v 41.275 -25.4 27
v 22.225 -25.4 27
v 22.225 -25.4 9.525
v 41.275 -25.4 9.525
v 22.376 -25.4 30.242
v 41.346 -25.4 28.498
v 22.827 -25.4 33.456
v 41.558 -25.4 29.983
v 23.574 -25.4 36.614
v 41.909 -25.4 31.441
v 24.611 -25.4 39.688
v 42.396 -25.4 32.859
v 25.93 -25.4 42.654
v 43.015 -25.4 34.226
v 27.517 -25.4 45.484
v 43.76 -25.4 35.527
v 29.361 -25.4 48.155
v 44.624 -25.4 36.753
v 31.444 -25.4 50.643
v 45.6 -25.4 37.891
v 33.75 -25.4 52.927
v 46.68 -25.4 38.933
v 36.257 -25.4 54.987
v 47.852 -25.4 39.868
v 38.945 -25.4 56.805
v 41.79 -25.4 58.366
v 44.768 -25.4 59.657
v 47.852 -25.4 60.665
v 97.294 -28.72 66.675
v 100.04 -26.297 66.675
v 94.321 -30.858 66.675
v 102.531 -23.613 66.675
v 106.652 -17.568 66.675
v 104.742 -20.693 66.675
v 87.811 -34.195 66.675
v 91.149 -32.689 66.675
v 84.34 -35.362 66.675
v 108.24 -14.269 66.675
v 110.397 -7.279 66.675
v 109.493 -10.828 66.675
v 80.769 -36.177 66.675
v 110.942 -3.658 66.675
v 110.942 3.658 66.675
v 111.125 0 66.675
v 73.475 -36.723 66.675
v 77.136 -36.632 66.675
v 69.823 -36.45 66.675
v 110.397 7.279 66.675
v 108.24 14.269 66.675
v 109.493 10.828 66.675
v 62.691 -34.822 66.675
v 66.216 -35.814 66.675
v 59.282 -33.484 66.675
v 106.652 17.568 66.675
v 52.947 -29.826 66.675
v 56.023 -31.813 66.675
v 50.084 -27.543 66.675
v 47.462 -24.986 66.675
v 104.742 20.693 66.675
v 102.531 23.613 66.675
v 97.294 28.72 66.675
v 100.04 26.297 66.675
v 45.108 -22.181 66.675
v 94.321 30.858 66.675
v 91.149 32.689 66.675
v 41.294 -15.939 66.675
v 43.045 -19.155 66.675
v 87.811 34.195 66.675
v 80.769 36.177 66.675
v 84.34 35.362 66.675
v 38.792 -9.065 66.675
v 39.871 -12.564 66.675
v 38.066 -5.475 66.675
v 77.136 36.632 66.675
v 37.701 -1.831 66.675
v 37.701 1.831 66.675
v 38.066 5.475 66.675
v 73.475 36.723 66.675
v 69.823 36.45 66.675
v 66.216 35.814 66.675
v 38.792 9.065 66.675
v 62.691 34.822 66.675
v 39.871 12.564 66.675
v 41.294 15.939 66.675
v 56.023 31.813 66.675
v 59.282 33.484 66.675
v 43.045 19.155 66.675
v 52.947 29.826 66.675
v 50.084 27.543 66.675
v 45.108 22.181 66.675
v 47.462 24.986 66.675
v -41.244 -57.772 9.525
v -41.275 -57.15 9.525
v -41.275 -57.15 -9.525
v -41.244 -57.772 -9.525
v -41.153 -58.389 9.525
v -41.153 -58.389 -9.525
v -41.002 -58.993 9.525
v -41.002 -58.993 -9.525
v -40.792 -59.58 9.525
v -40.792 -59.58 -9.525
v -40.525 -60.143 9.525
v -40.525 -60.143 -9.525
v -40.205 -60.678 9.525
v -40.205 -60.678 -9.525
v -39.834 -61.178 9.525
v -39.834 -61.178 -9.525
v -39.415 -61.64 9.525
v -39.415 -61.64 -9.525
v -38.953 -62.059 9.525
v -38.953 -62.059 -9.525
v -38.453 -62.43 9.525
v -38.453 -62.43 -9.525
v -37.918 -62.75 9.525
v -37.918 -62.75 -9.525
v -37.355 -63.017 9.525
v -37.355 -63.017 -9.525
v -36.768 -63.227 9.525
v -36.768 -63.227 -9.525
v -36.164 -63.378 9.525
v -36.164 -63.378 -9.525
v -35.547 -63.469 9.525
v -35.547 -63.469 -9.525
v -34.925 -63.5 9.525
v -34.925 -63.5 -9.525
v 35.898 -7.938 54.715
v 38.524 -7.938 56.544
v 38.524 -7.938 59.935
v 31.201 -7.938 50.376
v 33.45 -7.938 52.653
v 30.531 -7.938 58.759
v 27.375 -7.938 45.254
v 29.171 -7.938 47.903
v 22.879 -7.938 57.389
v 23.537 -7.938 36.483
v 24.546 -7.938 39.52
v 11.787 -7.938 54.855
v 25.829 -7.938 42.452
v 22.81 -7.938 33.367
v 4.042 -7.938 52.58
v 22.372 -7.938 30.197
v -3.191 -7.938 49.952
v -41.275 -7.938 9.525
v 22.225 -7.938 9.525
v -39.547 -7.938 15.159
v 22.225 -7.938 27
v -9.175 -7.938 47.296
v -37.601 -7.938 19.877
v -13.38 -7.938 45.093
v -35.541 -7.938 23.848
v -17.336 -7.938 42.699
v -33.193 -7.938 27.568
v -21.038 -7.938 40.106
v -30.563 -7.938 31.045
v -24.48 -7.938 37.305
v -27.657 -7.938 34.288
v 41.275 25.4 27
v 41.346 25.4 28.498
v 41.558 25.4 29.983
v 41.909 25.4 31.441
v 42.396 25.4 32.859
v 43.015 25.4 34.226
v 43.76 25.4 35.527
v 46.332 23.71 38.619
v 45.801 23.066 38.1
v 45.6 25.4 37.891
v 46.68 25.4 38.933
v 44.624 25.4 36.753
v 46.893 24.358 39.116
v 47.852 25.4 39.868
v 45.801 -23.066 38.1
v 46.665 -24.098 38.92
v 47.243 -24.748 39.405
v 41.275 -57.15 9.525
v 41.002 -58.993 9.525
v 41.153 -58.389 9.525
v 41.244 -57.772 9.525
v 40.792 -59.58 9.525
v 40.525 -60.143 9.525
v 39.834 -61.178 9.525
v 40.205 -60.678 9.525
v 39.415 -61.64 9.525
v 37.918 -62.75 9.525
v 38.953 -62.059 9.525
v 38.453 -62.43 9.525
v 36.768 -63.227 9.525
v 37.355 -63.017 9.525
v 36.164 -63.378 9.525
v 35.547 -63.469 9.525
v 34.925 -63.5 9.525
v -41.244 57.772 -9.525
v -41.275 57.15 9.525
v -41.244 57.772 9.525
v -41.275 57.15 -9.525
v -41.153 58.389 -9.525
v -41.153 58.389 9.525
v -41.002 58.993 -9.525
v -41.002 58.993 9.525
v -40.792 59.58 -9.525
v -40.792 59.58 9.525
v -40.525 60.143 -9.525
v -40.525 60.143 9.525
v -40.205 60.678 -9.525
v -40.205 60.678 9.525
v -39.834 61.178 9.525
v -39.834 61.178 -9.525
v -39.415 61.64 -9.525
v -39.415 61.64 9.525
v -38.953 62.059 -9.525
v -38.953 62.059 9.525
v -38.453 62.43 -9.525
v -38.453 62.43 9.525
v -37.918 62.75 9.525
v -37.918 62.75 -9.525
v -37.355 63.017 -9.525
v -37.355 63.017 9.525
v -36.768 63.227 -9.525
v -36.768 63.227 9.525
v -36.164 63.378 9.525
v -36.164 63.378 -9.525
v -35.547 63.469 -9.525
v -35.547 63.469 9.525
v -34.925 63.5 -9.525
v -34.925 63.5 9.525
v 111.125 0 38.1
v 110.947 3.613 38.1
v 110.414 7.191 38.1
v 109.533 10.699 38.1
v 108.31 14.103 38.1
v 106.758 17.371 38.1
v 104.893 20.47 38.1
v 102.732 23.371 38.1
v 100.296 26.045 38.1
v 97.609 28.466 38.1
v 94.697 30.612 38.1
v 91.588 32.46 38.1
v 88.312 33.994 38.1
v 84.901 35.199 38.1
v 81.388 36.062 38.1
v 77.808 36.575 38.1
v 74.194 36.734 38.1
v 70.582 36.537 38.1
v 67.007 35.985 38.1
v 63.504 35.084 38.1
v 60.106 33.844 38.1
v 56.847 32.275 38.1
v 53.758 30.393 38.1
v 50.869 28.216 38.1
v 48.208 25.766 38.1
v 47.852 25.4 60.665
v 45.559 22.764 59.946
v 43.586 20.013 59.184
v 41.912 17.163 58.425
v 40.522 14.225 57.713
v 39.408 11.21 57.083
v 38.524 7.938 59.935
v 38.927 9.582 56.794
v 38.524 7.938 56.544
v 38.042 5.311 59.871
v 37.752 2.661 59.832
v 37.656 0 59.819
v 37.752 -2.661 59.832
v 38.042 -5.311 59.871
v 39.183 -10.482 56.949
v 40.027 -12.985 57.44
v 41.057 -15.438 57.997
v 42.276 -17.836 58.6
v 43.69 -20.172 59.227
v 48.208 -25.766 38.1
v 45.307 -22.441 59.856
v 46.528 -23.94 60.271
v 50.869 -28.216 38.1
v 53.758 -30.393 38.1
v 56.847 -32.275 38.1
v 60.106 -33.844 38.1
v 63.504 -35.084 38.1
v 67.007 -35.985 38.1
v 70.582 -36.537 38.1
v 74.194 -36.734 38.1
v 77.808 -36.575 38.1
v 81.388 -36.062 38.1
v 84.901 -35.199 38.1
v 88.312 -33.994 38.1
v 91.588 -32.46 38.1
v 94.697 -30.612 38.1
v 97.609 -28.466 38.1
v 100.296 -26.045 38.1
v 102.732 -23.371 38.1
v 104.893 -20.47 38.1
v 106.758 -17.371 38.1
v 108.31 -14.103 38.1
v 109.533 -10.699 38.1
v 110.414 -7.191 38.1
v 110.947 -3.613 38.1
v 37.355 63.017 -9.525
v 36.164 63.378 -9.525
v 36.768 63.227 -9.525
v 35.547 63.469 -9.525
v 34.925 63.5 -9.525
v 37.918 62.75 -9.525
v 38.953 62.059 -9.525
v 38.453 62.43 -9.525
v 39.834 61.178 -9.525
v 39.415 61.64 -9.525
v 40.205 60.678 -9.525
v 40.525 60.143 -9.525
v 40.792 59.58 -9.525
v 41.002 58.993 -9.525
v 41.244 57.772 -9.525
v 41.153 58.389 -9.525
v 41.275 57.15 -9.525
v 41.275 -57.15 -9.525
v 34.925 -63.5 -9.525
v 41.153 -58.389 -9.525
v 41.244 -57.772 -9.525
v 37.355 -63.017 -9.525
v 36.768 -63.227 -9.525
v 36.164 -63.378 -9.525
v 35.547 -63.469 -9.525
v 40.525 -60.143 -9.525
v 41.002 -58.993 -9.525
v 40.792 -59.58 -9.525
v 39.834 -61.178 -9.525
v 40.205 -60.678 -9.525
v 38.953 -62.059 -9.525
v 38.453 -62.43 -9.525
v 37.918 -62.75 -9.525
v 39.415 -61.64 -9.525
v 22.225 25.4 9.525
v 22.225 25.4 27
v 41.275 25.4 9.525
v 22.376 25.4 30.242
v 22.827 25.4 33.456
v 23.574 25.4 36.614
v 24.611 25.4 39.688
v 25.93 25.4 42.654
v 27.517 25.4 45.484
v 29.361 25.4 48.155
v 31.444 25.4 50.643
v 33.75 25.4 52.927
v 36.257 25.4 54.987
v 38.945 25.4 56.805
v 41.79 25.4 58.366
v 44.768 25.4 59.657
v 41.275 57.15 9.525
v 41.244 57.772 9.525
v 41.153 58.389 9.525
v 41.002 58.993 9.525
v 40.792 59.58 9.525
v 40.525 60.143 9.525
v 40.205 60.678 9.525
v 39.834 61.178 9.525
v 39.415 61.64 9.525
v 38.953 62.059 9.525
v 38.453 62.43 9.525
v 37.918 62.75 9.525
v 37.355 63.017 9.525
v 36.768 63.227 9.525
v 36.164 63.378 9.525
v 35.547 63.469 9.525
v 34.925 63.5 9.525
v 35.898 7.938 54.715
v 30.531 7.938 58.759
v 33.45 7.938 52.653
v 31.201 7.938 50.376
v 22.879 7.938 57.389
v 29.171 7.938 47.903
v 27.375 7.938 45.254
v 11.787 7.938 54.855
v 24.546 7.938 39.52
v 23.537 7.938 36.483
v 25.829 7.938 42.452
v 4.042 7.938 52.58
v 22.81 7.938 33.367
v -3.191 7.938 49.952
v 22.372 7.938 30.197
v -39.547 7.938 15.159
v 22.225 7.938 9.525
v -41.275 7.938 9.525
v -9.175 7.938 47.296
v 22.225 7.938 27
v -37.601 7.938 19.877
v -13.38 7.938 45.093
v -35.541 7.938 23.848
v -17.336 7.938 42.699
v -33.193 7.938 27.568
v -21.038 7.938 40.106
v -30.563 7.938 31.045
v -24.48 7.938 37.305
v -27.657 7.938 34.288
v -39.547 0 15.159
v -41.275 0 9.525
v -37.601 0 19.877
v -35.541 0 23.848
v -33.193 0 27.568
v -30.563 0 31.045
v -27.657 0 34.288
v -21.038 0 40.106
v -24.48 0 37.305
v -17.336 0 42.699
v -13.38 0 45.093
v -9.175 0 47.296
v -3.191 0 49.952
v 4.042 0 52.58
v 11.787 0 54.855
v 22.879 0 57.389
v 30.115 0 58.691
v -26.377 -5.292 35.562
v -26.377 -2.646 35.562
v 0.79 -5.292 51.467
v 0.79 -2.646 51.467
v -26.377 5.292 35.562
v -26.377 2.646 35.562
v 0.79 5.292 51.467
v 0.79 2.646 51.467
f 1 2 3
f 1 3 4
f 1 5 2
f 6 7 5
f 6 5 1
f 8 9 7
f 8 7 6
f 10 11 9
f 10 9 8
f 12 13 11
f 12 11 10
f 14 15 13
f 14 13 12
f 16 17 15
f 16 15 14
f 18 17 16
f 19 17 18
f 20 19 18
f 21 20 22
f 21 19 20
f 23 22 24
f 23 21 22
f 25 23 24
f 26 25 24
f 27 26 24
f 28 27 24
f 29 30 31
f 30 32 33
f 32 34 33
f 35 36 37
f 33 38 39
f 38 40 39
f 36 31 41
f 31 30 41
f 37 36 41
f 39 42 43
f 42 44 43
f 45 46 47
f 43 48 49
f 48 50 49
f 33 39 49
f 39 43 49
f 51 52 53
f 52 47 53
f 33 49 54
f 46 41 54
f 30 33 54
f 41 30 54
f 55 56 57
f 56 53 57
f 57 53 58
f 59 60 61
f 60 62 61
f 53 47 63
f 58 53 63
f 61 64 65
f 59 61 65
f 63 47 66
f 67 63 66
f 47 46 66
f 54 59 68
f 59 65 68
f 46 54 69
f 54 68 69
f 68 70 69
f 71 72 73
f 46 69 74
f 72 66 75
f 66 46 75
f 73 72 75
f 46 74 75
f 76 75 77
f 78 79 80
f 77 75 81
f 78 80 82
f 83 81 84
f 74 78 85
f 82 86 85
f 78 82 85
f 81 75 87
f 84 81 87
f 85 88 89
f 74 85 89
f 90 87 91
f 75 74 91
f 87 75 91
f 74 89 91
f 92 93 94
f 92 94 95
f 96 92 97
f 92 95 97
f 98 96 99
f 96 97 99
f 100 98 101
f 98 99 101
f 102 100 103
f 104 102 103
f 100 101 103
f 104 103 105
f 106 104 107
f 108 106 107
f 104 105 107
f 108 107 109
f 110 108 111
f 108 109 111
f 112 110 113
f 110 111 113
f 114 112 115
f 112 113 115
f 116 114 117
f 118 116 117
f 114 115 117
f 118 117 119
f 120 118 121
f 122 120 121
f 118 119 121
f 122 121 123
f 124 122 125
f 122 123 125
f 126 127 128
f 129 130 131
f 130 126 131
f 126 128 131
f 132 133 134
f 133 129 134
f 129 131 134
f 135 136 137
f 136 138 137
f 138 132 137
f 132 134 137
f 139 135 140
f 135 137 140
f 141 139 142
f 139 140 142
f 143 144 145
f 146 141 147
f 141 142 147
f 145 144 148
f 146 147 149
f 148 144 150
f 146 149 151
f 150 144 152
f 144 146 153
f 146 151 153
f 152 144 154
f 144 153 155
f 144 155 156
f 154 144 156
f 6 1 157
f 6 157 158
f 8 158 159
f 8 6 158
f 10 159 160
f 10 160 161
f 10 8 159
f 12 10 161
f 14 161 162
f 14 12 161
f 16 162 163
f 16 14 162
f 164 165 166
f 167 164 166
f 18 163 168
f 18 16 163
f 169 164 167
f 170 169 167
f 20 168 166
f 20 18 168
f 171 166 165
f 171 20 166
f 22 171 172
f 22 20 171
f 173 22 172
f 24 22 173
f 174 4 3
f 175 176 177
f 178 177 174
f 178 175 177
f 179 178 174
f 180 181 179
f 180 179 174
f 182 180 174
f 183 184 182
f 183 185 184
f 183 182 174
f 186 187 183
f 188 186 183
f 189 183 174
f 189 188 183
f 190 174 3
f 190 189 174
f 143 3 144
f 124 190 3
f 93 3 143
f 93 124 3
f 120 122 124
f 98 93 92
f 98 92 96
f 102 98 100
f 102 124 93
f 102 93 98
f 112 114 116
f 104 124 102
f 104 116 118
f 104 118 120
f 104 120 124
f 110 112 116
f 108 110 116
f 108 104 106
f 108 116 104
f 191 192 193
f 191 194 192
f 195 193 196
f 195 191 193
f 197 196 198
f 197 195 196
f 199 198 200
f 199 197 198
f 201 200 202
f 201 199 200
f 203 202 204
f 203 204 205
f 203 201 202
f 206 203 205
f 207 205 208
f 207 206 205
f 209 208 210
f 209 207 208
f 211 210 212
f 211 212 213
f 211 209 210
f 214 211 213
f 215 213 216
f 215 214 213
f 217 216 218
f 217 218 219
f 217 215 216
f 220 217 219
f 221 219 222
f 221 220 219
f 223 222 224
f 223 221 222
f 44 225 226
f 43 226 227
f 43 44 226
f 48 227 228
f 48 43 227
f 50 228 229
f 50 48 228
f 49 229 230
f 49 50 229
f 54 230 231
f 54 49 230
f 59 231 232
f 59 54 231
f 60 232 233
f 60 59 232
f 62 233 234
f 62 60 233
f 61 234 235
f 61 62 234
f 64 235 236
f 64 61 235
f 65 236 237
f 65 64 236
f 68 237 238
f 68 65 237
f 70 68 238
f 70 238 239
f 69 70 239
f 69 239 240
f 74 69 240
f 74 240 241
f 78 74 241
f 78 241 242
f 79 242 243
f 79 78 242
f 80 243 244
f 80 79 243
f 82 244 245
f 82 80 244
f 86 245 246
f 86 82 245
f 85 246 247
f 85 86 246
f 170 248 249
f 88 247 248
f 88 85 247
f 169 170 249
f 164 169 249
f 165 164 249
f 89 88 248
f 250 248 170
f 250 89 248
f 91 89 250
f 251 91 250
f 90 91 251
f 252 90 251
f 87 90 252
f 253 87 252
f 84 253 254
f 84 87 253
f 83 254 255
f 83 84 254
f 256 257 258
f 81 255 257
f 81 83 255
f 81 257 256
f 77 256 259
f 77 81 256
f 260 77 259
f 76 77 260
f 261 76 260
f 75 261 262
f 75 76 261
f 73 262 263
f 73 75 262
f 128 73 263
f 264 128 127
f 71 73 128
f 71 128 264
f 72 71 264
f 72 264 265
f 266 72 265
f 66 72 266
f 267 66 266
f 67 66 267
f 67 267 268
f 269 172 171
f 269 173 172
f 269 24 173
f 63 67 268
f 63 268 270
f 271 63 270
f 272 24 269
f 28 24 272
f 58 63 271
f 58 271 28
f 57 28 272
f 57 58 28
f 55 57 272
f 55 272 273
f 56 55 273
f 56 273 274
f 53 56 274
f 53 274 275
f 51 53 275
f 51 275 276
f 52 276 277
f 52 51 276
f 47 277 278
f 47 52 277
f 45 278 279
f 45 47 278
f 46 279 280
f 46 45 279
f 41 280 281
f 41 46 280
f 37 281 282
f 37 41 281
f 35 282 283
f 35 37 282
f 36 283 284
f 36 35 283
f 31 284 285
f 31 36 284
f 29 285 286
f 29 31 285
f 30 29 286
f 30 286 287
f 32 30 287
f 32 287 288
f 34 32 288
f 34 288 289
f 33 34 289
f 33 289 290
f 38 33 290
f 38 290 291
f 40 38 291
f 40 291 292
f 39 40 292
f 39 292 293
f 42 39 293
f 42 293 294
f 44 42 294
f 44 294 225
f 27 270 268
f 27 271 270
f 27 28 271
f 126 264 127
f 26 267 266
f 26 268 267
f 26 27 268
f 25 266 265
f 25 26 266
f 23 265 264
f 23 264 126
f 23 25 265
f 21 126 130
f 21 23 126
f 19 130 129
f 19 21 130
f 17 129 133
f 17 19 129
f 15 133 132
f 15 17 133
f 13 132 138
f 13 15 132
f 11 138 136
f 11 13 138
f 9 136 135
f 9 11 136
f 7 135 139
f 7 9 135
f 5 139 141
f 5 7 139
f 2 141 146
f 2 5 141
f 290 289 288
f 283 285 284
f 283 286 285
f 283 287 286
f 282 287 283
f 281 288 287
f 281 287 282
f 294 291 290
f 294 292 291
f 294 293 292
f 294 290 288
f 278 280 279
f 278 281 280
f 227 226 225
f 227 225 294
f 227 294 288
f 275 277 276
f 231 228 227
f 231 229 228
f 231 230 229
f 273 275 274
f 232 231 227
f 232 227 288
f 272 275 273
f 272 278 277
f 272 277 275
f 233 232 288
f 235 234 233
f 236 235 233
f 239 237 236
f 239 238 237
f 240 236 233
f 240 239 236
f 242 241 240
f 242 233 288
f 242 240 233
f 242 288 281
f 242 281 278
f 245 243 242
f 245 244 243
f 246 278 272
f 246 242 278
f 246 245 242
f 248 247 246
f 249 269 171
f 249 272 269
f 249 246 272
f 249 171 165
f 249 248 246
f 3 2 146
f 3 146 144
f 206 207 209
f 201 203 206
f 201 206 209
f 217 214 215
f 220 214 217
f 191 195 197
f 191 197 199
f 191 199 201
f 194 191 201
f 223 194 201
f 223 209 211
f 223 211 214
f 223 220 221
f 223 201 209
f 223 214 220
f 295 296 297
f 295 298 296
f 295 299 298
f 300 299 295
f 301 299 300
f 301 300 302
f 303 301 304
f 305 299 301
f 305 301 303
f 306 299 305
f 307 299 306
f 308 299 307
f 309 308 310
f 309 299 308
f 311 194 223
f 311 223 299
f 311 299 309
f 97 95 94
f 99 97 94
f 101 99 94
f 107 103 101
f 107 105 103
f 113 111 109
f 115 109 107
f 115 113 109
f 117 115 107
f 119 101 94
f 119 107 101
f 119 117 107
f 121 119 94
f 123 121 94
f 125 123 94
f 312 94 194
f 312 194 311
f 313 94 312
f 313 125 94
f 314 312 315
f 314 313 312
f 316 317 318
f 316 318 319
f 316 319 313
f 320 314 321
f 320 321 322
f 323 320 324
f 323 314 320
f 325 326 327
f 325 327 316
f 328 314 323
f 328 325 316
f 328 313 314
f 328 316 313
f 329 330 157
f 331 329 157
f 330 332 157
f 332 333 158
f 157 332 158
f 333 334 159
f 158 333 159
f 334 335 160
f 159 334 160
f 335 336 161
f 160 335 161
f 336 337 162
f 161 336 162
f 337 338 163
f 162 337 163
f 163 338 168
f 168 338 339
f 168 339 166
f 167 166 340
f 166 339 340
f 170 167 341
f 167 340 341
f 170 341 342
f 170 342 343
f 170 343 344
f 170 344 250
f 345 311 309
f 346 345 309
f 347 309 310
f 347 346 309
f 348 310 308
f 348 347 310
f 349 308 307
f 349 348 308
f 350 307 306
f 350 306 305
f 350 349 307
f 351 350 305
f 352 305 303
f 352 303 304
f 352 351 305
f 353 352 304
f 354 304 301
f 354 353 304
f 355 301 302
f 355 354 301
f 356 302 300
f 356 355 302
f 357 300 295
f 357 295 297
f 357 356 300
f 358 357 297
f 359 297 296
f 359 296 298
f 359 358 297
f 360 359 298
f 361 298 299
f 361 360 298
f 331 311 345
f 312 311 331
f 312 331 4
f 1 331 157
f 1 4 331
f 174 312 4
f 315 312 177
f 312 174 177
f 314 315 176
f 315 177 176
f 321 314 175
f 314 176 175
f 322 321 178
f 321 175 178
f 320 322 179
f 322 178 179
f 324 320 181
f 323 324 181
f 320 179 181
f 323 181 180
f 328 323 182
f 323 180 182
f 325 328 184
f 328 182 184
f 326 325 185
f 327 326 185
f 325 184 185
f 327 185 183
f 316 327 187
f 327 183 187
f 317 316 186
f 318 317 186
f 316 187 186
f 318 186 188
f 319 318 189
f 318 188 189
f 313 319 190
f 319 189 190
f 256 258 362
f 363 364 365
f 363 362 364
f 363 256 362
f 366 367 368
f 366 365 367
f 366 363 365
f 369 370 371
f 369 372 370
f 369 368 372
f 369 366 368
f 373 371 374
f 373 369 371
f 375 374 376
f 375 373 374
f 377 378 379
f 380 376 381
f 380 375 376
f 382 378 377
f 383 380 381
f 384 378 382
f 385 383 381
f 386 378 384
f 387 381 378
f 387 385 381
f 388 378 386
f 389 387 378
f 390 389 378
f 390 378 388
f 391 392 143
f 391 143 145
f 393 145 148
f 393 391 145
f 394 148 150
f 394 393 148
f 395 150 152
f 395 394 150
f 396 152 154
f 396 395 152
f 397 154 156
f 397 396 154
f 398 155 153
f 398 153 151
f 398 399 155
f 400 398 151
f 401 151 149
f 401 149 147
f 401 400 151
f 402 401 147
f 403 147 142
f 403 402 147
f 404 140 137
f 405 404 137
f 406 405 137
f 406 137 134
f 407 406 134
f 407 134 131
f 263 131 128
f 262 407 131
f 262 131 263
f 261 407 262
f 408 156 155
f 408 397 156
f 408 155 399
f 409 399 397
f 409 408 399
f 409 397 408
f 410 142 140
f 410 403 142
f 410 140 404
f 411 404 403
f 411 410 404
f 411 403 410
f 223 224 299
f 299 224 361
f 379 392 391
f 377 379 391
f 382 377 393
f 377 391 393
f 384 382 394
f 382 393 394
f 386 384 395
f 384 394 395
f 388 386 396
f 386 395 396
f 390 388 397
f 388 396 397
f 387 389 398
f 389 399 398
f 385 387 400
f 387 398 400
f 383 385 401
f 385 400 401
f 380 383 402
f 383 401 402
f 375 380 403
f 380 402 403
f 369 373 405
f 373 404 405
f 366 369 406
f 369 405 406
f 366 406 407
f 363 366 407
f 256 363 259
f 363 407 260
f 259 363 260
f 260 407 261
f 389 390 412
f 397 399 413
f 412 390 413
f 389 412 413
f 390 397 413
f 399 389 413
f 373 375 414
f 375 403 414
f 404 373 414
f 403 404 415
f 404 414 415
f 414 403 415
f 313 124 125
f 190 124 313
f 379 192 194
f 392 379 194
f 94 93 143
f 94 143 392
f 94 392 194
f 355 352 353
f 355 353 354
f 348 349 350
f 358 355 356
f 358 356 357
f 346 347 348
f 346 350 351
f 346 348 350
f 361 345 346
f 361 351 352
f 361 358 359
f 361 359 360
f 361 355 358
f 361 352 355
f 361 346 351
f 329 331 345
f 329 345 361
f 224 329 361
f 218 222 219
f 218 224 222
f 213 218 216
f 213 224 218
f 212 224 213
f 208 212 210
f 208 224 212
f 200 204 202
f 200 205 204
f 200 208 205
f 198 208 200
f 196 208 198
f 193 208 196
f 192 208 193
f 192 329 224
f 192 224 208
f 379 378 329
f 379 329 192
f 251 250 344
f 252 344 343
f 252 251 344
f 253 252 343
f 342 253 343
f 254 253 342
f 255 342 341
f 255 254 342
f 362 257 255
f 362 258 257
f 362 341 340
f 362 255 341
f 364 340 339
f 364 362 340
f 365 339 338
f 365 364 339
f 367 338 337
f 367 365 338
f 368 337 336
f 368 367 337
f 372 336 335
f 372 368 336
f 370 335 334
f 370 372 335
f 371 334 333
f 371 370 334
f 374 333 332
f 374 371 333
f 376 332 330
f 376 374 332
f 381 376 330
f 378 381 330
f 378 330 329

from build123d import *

# Parameters (mm, degrees)
F1_DEPTH = 63.5
F2_DEPTH = 25.4
F3_DEPTH = 7.9375
F0_W     = 36.734618
F0_H     = 28.575
F5_R     = 6.35


with BuildPart() as f1:
    # F0 (on Front) → F1 (new body, symmetric)
    with BuildSketch(Plane.XZ):
        Polygon((-41.275, 9.525), (-41.275, -9.525), (41.275, -9.525), (41.275, 9.525), (22.225, 9.525), align=None)
    extrude(amount=F1_DEPTH, both=True)

    # F0 (on Front) → F2 (join, symmetric)
    with BuildSketch(Plane.XZ):
        with BuildLine():
            Line((22.225, 9.525), (41.275, 9.525))
            Line((41.275, 9.525), (41.275, 27.0002))
            ThreePointArc((41.275, 27.0002), (45.92468, 38.22552), (57.15, 42.8752))
            Line((57.15, 42.8752), (60.325, 42.8752))
            Line((60.325, 42.8752), (60.325, 61.9252))
            Line((60.325, 61.9252), (57.15, 61.9252))
            add(Edge.make_bspline(
                [(50.826813, 61.348023), (52.907758, 61.552865), (55.015741, 61.744854), (57.15, 61.9252)],
                knots=[106.970225, 106.970225, 106.970225, 106.970225, 111.504536, 111.504536, 111.504536, 111.504536], degree=3))
            ThreePointArc((50.826813, 61.348023), (30.311661, 49.348783), (22.225, 27.0002))
            Line((22.225, 27.0002), (22.225, 9.525))
        make_face()
        Polygon((60.325, 66.675), (60.325, 61.9252), (60.325, 42.8752), (60.325, 38.1), (74.390382, 38.1), (74.390382, 66.675), align=None)
    extrude(amount=F2_DEPTH, both=True)

    # F0 (on Front) → F3 (join, symmetric)
    with BuildSketch(Plane.XZ):
        with BuildLine():
            add(Edge.make_bspline(
                [(-41.275, 9.525), (-32.308794, 44.530056), (1.734671, 56.515538), (50.826813, 61.348023)],
                knots=[0, 0, 0, 0, 106.970225, 106.970225, 106.970225, 106.970225], degree=3))
            Line((-41.275, 9.525), (22.225, 9.525))
            Line((22.225, 9.525), (22.225, 27.0002))
            ThreePointArc((22.225, 27.0002), (30.311661, 49.348783), (50.826813, 61.348023))
        make_face()
    extrude(amount=F3_DEPTH, both=True)

    # F0 (on Front) → F4 (revolve)
    with BuildSketch(Plane.XZ):
        with Locations((92.757691, 52.3875)):
            Rectangle(F0_W, F0_H)
    revolve(axis=Axis((74.390382, 0, 52.3875), (0, 0, 1)))

    # F5
    f5_edges = [f1.edges().sort_by_distance(p)[0] for p in [
        (-41.275, -63.5, 0),
        (41.275, -63.5, 0),
        (41.275, 63.5, 0),
        (-41.275, 63.5, 0),
    ]]
    fillet(f5_edges, radius=F5_R)


solid = f1.part
